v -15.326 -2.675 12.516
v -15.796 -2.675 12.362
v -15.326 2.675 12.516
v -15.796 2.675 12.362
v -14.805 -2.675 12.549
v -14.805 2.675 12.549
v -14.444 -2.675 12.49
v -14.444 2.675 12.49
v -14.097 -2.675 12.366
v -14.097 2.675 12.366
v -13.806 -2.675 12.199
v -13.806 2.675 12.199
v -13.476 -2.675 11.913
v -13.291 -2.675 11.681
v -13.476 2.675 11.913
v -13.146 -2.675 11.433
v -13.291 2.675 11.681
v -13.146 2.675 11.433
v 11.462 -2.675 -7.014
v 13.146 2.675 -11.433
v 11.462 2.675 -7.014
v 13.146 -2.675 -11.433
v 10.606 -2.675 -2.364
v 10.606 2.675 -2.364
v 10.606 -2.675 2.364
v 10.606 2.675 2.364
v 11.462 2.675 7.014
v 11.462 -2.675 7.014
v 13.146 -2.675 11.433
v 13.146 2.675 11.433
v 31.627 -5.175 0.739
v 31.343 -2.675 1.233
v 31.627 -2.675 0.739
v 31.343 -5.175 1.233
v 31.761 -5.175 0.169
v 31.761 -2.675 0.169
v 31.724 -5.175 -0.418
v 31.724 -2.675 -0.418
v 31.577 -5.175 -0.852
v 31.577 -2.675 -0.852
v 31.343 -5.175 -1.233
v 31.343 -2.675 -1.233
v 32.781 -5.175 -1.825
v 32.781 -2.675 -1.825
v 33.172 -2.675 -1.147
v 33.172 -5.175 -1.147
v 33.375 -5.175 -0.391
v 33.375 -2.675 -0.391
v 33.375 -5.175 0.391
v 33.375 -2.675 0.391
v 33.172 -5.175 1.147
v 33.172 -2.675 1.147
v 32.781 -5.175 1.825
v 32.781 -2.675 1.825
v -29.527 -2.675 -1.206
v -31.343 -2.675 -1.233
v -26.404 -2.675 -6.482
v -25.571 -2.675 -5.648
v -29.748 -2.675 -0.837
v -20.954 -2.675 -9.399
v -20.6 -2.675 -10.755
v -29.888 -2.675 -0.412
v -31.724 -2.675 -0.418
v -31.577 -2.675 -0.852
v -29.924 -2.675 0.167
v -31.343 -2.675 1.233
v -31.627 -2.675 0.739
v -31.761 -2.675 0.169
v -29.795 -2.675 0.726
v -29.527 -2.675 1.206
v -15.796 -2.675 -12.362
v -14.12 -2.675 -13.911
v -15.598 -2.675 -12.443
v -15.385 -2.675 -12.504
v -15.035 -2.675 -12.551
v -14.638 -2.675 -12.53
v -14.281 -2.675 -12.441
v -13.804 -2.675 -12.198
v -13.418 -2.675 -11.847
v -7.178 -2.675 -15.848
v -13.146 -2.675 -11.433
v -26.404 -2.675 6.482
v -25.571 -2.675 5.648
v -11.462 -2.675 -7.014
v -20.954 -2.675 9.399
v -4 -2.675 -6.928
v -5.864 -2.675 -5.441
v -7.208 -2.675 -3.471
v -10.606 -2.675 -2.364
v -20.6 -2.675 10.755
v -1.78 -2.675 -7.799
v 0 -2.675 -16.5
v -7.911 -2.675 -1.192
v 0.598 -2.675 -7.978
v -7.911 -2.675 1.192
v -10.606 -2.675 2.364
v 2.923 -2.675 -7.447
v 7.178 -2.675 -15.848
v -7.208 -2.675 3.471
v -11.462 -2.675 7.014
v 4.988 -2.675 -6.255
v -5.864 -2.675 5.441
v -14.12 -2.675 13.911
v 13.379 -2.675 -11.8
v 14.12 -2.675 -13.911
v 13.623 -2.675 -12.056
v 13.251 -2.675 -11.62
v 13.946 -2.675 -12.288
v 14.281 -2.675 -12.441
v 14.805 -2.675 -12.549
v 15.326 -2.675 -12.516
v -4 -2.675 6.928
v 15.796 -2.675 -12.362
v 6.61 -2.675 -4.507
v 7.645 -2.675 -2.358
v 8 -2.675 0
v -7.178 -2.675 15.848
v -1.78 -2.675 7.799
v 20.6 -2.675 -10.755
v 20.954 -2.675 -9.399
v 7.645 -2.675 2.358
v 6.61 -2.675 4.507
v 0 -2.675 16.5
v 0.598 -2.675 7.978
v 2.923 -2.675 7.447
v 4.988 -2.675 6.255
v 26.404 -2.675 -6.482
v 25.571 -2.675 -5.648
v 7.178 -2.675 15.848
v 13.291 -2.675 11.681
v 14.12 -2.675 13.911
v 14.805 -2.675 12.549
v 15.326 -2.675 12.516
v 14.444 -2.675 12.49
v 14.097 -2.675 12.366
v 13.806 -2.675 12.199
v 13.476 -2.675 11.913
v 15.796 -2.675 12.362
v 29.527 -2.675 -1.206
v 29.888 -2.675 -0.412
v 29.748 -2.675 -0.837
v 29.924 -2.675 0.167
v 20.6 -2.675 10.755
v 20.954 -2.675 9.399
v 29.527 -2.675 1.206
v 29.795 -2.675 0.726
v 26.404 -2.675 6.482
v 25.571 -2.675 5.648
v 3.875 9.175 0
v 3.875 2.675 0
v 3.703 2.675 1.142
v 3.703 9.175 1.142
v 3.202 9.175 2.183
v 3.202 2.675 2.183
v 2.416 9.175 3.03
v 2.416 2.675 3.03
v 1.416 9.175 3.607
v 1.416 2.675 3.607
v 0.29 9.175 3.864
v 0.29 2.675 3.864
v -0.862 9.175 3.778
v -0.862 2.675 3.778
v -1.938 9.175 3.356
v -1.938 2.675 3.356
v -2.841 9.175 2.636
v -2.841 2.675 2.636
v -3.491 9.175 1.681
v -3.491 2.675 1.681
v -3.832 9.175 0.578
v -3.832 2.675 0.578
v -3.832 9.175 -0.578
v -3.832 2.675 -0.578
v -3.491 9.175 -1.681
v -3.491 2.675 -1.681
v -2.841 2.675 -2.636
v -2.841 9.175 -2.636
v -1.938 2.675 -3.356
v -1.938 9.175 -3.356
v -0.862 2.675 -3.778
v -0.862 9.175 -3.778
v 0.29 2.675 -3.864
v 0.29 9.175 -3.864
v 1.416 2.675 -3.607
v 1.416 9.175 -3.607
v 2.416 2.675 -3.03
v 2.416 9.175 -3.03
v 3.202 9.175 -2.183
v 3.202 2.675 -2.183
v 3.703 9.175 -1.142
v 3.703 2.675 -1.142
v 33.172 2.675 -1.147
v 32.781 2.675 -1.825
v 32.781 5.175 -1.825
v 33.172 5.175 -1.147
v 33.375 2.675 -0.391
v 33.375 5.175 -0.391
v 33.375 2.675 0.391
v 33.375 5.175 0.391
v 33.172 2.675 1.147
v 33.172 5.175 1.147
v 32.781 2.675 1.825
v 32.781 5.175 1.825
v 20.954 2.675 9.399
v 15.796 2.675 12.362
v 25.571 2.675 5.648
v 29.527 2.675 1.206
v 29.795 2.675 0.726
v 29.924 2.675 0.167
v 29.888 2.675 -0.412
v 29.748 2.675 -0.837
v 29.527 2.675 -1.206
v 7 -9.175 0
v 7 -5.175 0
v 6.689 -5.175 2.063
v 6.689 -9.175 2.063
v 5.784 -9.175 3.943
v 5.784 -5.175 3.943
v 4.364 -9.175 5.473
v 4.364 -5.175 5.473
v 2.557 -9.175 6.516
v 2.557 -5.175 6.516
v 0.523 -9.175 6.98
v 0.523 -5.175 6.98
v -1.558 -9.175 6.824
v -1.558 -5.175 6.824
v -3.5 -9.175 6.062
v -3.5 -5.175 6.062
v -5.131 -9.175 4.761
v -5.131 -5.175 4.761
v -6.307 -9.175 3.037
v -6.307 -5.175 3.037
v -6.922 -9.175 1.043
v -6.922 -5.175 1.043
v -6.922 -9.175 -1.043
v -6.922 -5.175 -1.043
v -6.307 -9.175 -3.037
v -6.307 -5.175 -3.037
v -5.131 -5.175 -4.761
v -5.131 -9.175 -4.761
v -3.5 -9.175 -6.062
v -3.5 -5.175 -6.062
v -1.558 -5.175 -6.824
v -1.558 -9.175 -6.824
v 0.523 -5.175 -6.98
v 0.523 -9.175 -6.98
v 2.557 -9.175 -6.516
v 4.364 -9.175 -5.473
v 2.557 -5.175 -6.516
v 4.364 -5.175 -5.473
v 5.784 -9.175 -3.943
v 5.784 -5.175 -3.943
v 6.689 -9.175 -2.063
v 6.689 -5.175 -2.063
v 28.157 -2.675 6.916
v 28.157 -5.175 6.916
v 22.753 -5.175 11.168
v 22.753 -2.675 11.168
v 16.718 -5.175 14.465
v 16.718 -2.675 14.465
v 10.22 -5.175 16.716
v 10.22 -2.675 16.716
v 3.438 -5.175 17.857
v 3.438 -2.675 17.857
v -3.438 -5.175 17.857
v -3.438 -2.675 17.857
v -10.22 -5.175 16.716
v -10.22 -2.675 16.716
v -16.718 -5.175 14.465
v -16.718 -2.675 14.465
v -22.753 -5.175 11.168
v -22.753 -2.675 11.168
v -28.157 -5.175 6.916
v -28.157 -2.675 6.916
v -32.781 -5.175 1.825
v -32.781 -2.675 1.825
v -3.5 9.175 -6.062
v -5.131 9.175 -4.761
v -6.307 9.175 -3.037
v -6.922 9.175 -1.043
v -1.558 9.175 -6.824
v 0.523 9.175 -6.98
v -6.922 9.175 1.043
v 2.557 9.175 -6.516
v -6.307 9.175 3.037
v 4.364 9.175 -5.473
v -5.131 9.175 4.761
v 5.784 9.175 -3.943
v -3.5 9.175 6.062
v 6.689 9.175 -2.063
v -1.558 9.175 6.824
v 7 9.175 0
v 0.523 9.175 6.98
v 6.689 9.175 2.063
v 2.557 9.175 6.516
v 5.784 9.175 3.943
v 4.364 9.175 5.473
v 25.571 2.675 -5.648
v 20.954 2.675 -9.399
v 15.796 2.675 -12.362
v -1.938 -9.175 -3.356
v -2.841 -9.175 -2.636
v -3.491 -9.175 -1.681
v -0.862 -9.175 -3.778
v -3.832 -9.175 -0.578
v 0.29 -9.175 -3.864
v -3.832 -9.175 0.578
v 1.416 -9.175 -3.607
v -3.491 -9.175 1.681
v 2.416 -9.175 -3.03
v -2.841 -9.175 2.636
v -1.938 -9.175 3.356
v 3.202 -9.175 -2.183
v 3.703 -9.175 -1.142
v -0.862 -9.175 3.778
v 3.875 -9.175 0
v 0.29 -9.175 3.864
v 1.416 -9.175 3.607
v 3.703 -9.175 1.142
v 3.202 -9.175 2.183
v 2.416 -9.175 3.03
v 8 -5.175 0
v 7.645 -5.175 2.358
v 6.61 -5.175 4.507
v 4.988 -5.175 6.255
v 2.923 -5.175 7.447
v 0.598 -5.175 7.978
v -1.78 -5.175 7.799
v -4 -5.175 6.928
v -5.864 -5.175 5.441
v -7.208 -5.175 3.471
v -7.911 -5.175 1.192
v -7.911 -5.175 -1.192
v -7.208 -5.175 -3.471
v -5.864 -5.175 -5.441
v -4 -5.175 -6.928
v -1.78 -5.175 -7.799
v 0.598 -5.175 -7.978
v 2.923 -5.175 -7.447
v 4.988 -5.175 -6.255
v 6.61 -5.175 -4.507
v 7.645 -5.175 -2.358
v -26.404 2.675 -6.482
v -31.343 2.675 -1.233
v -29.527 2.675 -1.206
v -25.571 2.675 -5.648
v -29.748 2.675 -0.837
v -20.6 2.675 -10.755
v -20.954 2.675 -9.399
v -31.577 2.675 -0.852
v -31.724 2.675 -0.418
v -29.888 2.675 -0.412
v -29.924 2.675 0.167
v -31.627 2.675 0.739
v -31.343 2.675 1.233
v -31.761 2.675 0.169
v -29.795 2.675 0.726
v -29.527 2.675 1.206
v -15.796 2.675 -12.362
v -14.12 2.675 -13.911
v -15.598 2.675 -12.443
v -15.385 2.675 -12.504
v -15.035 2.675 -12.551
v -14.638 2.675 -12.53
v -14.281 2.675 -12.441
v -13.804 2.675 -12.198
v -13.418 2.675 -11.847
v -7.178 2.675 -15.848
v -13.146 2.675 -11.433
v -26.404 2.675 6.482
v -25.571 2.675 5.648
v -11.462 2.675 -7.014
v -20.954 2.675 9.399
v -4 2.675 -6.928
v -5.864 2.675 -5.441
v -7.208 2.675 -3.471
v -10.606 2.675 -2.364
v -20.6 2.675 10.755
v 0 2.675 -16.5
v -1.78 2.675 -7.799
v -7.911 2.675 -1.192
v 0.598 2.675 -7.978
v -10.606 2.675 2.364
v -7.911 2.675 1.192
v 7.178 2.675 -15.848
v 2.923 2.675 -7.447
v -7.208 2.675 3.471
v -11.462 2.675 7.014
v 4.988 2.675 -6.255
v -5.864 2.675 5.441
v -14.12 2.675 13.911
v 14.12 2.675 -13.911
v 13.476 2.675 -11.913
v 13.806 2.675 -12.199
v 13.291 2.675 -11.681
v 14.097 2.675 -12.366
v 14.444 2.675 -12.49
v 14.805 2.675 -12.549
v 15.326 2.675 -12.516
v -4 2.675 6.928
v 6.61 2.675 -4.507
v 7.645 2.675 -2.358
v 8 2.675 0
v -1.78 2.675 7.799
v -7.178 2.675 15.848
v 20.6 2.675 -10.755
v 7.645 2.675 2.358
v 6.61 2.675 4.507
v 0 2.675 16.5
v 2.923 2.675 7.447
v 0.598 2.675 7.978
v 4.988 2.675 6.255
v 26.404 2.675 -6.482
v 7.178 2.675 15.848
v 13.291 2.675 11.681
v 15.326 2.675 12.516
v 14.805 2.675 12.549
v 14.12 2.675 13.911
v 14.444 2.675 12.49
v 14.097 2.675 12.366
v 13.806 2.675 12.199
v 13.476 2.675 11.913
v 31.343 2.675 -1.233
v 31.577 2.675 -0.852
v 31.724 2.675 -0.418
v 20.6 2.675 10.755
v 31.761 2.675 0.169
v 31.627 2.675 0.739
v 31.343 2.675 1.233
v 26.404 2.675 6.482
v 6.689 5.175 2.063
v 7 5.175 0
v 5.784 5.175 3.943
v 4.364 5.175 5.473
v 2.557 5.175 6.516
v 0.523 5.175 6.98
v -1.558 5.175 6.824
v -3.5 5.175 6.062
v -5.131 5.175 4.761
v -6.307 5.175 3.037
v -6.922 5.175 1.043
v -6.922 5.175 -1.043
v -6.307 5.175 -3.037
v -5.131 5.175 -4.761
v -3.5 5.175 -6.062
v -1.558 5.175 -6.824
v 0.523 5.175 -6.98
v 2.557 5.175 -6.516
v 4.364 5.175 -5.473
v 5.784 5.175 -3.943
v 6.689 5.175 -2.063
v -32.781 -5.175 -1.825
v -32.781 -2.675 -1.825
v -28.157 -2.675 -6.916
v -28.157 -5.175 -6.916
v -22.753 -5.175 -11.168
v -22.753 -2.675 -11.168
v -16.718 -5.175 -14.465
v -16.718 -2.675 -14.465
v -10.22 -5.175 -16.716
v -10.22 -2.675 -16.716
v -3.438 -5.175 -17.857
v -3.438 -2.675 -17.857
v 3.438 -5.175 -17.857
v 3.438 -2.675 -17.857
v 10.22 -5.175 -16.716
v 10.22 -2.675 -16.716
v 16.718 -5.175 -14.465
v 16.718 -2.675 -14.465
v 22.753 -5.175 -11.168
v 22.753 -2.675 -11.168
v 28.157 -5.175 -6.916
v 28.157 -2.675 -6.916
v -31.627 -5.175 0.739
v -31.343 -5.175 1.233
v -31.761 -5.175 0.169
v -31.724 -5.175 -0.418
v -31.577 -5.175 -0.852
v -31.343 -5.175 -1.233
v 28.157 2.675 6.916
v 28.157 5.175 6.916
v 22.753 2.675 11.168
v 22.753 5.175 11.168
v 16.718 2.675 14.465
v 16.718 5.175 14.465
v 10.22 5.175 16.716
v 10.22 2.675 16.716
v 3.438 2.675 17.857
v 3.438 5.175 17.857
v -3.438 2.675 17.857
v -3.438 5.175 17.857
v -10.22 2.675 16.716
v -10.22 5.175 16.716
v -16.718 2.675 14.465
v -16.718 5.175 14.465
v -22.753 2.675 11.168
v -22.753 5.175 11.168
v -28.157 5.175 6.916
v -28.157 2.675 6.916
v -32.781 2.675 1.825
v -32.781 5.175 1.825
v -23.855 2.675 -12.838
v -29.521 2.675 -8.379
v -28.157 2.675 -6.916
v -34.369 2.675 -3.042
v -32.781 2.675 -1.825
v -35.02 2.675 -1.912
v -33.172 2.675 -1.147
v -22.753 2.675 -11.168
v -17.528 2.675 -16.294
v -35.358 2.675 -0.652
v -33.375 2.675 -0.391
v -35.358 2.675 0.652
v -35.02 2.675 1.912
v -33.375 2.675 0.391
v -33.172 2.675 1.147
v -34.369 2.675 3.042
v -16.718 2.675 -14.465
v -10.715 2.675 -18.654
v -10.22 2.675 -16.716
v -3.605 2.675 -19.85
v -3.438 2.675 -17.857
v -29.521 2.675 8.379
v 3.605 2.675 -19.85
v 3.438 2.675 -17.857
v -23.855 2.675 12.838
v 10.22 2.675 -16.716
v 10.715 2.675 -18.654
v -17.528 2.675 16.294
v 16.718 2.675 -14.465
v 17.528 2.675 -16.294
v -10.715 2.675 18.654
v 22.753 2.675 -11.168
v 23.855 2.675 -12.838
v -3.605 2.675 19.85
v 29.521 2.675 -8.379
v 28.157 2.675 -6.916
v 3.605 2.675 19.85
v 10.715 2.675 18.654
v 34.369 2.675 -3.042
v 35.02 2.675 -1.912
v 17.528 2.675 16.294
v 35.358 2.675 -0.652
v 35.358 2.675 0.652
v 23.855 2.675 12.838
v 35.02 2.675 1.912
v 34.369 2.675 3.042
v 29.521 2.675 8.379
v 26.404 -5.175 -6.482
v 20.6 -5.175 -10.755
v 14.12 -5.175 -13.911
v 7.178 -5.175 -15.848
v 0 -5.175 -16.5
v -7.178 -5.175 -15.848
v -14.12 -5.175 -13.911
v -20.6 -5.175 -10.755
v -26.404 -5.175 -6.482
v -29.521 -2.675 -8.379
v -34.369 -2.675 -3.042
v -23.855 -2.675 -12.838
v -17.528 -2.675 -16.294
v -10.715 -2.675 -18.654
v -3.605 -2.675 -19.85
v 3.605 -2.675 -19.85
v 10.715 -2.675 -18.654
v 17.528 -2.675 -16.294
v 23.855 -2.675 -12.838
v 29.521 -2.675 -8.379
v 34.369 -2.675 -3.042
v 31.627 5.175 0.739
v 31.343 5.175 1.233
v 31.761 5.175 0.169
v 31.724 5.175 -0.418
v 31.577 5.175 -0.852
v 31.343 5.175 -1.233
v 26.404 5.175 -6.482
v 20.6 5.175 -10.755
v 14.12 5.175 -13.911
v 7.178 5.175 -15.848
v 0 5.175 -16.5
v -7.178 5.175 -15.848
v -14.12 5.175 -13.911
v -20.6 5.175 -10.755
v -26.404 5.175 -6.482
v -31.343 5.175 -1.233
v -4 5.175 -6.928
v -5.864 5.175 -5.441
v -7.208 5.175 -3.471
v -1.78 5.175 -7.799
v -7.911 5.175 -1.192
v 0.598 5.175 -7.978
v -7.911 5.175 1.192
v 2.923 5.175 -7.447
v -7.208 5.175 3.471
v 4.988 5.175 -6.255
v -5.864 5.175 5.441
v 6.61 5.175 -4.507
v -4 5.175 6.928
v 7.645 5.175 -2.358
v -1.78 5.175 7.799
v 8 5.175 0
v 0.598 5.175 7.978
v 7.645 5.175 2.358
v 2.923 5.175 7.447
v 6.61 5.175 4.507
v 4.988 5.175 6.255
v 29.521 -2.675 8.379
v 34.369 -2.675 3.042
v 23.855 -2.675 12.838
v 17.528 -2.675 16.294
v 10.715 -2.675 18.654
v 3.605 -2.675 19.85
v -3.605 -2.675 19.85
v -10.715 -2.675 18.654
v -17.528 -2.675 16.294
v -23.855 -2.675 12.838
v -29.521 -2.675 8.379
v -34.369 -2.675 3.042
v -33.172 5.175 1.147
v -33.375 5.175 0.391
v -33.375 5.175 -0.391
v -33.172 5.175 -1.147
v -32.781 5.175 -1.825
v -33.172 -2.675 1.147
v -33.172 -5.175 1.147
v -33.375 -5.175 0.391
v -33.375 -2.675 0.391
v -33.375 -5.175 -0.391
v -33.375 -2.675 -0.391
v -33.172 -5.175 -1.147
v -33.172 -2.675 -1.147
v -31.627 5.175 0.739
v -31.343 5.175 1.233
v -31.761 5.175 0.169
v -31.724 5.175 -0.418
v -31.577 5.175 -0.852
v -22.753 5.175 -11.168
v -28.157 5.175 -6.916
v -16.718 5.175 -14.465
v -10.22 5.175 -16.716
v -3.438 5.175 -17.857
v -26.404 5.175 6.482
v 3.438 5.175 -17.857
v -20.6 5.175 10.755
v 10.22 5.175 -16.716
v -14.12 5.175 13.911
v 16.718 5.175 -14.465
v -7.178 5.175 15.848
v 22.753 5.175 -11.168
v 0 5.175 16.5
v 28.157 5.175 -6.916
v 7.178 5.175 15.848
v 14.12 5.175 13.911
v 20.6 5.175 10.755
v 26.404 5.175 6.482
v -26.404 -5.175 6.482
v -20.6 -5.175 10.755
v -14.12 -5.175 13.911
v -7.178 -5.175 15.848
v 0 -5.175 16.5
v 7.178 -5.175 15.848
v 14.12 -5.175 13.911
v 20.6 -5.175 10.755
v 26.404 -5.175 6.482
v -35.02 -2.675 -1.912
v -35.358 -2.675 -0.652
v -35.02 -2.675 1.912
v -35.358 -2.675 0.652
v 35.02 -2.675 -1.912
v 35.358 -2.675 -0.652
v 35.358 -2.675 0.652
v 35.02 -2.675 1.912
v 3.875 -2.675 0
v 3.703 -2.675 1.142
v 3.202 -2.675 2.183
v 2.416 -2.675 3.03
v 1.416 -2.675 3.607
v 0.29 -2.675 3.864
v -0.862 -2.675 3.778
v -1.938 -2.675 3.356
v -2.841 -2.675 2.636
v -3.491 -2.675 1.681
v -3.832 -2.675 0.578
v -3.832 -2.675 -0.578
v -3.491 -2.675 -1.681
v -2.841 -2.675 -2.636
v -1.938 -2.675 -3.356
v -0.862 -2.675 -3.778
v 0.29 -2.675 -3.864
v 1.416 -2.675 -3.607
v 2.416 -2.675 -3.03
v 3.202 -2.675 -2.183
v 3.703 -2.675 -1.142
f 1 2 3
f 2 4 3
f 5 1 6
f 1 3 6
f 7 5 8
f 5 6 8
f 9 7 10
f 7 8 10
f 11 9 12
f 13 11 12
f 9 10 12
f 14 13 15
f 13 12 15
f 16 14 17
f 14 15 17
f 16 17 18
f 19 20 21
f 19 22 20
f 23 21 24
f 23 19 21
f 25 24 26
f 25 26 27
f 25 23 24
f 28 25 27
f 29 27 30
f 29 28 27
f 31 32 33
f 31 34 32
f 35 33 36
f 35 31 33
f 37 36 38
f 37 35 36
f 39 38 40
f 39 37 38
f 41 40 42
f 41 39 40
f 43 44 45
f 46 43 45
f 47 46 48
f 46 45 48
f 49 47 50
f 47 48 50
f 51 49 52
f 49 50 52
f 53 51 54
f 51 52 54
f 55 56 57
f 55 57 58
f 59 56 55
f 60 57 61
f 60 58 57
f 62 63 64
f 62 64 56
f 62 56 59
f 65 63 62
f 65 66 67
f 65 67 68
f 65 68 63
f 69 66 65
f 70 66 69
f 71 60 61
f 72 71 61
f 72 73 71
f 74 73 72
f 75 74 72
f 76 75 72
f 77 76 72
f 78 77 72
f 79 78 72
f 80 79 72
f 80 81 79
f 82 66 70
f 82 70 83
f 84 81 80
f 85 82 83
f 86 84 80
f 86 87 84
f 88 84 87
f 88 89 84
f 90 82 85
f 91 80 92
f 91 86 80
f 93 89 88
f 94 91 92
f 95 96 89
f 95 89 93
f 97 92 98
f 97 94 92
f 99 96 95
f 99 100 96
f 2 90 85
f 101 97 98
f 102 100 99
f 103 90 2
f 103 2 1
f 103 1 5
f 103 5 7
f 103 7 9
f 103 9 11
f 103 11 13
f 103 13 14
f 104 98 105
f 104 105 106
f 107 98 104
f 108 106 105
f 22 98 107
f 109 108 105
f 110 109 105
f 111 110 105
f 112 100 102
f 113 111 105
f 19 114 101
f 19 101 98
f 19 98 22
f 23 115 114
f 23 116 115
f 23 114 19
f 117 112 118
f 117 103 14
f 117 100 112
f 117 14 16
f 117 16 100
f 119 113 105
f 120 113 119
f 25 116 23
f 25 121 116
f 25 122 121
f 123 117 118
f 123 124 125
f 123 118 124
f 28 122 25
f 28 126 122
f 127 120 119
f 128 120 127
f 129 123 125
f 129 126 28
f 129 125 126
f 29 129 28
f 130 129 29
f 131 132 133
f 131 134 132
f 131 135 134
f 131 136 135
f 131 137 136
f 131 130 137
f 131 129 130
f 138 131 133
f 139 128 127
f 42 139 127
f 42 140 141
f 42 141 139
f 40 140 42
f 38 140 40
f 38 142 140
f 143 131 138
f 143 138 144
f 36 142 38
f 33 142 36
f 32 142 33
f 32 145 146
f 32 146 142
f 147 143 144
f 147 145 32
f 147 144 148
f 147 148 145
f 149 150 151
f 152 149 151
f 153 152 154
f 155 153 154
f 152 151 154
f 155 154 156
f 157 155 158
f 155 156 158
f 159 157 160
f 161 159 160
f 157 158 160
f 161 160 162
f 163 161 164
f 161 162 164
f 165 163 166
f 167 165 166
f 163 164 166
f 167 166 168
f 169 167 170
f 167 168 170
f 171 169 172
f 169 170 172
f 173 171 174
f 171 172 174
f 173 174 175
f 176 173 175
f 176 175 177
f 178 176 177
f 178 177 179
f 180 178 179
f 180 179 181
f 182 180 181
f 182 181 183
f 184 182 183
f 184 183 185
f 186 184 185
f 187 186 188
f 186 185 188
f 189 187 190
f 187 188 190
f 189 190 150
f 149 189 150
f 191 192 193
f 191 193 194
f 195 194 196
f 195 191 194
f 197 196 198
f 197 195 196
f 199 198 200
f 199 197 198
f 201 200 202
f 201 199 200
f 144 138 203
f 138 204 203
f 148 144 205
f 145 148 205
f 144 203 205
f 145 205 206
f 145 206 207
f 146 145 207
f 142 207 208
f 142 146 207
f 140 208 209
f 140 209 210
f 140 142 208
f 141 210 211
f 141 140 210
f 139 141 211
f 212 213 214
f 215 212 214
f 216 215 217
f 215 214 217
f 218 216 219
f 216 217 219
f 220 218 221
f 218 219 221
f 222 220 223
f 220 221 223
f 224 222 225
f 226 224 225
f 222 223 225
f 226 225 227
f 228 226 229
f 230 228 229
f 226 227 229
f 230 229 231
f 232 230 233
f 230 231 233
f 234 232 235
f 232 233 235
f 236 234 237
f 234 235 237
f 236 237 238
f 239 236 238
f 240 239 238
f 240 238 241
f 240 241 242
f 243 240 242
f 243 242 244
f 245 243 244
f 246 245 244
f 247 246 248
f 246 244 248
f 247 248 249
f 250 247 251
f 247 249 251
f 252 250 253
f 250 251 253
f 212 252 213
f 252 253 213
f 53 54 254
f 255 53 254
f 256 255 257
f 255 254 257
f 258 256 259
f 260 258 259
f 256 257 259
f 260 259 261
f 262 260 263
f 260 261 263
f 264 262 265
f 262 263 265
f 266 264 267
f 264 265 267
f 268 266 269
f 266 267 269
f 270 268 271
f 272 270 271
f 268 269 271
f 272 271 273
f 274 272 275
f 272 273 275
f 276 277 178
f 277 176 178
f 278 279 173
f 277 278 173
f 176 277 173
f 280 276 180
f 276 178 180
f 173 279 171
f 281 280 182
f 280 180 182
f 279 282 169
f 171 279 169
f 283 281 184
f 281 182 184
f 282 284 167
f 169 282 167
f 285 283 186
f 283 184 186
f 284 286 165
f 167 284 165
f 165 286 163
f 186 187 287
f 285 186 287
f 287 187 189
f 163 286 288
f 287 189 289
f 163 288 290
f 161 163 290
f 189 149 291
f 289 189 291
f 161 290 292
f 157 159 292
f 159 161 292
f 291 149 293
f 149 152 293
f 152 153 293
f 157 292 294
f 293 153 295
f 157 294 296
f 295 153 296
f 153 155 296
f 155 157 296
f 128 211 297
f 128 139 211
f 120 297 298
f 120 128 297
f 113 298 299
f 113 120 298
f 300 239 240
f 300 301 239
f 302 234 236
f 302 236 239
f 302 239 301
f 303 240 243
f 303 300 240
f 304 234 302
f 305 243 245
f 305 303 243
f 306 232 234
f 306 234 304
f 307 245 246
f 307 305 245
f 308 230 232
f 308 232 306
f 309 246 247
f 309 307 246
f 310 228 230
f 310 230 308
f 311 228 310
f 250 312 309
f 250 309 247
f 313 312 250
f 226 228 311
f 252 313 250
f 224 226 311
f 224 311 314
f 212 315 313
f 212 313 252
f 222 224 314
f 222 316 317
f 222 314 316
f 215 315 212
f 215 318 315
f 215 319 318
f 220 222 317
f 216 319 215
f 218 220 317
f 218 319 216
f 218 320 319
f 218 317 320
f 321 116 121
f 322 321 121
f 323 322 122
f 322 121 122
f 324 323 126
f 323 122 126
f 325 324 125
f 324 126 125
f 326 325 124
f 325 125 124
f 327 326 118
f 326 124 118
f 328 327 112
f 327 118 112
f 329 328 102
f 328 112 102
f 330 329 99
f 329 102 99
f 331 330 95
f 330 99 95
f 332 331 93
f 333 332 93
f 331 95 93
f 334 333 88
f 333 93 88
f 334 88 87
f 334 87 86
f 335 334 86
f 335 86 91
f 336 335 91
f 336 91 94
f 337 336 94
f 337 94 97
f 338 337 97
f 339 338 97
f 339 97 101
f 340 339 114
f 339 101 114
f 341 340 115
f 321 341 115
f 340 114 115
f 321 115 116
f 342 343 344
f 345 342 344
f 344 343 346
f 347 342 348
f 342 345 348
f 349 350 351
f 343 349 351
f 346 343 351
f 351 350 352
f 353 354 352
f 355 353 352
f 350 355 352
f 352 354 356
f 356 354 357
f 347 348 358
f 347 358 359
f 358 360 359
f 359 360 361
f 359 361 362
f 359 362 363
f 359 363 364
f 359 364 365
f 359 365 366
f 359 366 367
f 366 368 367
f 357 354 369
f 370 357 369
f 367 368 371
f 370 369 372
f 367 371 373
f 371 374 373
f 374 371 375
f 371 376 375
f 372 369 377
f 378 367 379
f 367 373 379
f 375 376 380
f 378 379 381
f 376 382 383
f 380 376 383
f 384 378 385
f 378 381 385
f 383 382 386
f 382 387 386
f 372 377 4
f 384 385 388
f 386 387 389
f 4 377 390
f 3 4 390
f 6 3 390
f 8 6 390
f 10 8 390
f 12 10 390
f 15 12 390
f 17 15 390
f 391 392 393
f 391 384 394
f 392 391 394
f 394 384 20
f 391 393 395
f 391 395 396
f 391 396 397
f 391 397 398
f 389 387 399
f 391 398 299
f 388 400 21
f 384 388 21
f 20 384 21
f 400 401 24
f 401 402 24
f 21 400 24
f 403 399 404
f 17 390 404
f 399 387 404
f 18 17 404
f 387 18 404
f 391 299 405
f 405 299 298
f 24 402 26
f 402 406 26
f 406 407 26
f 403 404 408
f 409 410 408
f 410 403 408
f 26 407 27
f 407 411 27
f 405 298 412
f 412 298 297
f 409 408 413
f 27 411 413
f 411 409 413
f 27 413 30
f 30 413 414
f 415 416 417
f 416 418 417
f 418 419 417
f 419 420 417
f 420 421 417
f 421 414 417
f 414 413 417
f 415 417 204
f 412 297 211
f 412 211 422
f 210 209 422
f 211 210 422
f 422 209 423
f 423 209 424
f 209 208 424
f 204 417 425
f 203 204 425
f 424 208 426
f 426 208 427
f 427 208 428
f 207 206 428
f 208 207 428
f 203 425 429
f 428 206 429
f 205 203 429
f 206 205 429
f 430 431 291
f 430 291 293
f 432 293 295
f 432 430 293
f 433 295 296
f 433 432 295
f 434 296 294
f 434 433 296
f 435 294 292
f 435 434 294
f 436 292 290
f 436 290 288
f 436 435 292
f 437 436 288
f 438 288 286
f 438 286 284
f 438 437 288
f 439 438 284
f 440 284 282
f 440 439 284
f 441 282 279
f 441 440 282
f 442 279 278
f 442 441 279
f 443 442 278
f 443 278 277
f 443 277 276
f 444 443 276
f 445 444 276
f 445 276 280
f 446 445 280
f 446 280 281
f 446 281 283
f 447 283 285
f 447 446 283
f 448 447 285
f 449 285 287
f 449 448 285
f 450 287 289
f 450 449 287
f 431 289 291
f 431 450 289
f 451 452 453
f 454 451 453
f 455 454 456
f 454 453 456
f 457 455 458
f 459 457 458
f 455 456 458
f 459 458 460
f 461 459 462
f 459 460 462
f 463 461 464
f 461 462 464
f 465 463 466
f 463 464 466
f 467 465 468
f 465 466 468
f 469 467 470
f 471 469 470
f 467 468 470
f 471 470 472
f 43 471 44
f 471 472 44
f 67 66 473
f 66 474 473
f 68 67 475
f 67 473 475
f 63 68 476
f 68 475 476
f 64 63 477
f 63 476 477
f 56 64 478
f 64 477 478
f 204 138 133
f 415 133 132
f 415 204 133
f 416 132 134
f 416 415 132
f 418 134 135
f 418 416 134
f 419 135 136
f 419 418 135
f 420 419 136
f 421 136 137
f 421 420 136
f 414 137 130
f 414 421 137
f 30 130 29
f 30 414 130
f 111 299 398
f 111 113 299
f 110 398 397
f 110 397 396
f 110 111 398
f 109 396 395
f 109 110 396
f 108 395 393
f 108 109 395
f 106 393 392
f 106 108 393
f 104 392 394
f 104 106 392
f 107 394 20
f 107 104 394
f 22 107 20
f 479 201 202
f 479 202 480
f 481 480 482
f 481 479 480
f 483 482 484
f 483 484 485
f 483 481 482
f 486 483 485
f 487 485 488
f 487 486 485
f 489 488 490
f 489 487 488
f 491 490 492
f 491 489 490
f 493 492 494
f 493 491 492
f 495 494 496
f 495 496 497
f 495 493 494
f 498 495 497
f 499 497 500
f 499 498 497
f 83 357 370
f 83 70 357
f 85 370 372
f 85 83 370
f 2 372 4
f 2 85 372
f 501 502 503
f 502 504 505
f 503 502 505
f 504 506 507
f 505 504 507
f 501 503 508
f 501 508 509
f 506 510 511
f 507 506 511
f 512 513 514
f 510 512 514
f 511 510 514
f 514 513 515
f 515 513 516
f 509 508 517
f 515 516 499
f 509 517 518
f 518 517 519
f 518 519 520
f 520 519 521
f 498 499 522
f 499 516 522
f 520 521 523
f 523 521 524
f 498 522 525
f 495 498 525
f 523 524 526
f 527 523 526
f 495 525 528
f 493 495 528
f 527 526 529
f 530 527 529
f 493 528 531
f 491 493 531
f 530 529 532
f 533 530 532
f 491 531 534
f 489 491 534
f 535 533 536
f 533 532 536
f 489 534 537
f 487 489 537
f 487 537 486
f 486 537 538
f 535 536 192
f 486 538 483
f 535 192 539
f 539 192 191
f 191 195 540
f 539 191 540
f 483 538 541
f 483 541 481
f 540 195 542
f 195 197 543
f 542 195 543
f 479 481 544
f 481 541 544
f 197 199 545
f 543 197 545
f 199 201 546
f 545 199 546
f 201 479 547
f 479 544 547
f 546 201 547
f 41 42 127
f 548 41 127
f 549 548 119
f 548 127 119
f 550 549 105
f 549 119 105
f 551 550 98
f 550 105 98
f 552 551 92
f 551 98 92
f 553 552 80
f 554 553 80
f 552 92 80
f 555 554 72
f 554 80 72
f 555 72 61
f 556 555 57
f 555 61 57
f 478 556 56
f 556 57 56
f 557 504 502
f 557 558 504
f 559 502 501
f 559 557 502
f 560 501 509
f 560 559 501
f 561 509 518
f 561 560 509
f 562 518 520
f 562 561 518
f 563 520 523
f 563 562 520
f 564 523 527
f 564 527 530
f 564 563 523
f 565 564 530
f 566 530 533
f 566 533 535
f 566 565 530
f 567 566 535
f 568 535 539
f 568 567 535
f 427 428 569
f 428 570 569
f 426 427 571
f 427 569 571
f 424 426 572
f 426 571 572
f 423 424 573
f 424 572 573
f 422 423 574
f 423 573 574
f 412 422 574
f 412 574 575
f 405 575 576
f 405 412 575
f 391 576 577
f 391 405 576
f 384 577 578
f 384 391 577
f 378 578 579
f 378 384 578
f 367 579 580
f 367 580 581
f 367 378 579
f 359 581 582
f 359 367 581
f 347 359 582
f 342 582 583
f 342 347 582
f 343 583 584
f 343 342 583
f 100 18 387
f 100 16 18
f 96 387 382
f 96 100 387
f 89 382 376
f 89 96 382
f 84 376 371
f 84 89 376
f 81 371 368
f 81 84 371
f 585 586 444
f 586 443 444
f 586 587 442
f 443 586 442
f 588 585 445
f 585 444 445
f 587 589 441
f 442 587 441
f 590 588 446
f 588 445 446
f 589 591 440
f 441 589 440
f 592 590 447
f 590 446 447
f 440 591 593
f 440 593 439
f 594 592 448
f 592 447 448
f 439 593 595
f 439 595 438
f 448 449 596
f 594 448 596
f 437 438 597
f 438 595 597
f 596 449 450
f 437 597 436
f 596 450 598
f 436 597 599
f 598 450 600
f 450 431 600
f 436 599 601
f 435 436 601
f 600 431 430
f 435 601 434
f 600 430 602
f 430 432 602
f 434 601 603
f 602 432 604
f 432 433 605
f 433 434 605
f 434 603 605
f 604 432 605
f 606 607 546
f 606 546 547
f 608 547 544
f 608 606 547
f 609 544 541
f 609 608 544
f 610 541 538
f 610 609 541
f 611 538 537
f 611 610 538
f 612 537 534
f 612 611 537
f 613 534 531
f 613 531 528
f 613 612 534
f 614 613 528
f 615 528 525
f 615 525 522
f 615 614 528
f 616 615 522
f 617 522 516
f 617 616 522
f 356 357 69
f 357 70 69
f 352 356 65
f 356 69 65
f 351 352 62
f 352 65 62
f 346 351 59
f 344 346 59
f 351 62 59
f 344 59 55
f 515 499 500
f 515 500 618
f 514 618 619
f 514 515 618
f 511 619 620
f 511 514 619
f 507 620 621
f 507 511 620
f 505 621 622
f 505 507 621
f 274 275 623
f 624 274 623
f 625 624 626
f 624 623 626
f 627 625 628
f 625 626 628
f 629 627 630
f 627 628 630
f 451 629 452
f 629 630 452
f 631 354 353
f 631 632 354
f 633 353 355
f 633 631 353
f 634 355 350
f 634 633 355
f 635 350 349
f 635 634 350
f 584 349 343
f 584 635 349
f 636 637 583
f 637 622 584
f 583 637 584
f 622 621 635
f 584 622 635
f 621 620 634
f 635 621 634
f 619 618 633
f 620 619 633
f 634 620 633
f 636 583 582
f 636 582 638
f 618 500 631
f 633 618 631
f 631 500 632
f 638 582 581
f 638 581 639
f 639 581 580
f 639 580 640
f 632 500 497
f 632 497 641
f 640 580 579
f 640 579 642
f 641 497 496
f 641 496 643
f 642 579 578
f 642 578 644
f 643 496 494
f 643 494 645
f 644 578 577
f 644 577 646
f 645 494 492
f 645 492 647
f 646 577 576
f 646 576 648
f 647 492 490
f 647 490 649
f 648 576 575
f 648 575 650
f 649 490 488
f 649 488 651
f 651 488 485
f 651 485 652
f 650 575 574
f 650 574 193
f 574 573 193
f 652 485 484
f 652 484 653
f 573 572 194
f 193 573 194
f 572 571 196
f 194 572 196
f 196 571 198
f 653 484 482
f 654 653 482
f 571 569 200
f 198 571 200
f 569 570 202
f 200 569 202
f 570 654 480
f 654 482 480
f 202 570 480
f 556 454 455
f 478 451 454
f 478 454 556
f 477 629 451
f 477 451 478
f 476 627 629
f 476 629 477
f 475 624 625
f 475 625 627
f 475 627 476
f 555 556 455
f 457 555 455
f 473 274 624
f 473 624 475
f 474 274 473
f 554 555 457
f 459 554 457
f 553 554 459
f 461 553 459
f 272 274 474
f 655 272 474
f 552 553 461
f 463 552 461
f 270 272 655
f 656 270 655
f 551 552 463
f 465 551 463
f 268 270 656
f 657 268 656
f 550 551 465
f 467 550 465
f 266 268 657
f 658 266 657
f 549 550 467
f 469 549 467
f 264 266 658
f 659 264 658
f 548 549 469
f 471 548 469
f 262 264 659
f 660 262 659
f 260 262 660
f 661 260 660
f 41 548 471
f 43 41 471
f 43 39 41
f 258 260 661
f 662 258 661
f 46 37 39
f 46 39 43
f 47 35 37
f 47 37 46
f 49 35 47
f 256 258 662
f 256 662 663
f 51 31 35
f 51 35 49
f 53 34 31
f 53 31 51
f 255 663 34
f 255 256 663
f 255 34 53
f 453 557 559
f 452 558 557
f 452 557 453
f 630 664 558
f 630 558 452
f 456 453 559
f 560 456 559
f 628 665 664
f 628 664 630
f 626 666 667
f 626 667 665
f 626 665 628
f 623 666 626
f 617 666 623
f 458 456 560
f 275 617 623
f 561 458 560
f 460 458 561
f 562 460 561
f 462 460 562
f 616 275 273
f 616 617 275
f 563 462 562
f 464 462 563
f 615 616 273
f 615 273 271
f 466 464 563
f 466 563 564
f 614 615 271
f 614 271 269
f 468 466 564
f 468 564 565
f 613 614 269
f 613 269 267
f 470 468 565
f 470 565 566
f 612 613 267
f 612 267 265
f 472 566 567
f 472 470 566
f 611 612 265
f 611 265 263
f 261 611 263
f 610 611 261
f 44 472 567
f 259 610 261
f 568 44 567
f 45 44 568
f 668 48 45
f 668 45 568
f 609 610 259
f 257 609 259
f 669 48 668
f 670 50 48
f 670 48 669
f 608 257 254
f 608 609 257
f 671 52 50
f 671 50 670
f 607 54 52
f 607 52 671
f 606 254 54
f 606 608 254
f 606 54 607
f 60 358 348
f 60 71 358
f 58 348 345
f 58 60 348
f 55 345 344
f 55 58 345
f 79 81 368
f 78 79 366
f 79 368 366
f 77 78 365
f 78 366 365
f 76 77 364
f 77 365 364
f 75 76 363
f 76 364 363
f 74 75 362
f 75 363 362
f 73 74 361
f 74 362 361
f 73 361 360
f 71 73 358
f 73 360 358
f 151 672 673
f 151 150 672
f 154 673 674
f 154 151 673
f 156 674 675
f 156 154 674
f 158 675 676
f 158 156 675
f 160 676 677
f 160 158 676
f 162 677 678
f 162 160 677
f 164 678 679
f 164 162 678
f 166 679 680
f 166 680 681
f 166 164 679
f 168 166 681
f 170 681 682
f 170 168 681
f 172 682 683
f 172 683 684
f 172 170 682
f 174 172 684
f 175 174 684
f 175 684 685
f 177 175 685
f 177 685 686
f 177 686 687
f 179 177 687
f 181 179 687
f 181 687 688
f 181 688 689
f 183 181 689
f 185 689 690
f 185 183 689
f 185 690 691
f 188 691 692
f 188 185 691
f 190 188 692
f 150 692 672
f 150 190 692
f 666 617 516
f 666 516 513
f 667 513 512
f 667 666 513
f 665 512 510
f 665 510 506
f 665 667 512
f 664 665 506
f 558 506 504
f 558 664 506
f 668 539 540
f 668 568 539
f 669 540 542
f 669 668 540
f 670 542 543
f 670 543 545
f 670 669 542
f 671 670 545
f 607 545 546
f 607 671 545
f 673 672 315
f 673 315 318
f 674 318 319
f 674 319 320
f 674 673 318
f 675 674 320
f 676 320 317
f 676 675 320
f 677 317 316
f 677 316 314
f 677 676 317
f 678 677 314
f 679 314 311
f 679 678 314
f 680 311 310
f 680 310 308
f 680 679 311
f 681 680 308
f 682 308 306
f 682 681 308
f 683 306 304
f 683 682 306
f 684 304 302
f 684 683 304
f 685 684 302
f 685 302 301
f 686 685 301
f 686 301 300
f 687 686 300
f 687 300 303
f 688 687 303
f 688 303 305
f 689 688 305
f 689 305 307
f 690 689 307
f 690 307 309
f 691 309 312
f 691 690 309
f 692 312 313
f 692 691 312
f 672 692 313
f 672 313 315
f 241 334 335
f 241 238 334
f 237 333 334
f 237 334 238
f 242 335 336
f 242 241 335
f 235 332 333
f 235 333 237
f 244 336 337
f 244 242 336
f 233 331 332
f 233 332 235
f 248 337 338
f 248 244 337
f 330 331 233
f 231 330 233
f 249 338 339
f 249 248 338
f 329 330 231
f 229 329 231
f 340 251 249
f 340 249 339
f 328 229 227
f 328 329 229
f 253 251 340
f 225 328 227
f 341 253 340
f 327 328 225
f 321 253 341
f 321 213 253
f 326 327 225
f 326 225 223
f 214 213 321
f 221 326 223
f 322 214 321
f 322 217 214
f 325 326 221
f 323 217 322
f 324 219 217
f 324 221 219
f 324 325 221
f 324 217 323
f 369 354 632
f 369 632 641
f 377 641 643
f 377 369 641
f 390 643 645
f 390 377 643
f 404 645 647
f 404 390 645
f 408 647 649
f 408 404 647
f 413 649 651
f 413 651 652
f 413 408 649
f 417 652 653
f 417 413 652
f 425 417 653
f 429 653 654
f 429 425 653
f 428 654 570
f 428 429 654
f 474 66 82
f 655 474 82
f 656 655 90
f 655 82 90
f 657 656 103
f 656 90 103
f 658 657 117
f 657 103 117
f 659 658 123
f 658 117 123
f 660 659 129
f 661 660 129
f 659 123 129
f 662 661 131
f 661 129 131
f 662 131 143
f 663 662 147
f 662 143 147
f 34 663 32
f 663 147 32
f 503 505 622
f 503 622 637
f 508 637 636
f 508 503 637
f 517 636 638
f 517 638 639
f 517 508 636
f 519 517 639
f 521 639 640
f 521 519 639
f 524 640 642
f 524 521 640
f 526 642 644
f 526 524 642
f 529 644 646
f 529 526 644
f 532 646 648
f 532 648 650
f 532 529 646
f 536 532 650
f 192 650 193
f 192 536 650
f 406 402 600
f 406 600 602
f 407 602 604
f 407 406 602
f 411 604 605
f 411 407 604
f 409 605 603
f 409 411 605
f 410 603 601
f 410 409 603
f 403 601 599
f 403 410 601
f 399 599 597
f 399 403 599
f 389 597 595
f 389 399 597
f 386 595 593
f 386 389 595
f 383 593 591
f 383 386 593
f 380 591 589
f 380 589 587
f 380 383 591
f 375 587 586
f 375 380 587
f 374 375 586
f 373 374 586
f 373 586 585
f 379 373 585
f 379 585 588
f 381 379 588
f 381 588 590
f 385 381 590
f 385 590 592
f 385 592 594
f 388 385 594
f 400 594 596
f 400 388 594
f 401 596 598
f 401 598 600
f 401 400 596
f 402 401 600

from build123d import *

# Parameters (mm, degrees)
F0_R     = 3.875
F1_DEPTH = 2.675
F2_R     = 2
F3_R     = 8
F3_R_2   = 3.875
F4_DEPTH = 2.5
F5_R     = 2
F6_R     = 7
F6_R_2   = 3.875
F7_DEPTH = 4


with BuildPart() as f1:
    # F0 (on Front) → F1 (new body, symmetric)
    with BuildSketch(Plane.XZ):
        with BuildLine():
            ThreePointArc((34.3685322209, -3.0420949584), (35.4004522993, 0), (34.3685322209, 3.0420949584))
            ThreePointArc((34.3685322209, 3.0420949584), (0, 20), (-34.3685322209, 3.0420949584))
            ThreePointArc((-34.3685322209, 3.0420949584), (-35.4004522993, 0), (-34.3685322209, -3.0420949584))
            ThreePointArc((-34.3685322209, -3.0420949584), (0, -20), (34.3685322209, -3.0420949584))
        make_face()
        with BuildLine():
            ThreePointArc((-30.4004522993, 0), (-23.1775008297, 7.7461532708), (-14.0563482176, 13.129320875))
            ThreePointArc((-14.0563482176, 13.129320875), (-10.4981429131, 0), (-14.0563482176, -13.129320875))
            ThreePointArc((-14.0563482176, -13.129320875), (-23.1775008297, -7.7461532708), (-30.4004522993, 0))
        make_face(mode=Mode.SUBTRACT)
        Circle(F0_R, mode=Mode.SUBTRACT)
        with BuildLine():
            ThreePointArc((14.0563482176, 13.129320875), (23.1775008297, 7.7461532708), (30.4004522993, 0))
            ThreePointArc((30.4004522993, 0), (23.1775008297, -7.7461532708), (14.0563482176, -13.129320875))
            ThreePointArc((14.0563482176, -13.129320875), (10.4981429131, 0), (14.0563482176, 13.129320875))
        make_face(mode=Mode.SUBTRACT)
    extrude(amount=F1_DEPTH, both=True)

    # F2
    f2_edges = [f1.edges().sort_by_distance(p)[0] for p in [
        (-14.056348, 0, 13.129321),
        (-30.400452, 0, 0),
        (-14.056348, 0, -13.129321),
        (14.056348, 0, 13.129321),
        (30.400452, 0, 0),
        (14.056348, 0, -13.129321),
    ]]
    fillet(f2_edges, radius=F2_R)

    # F3 (on face) → F4 (join)
    with BuildSketch(Plane.XZ.offset(2.675)):
        with BuildLine():
            ThreePointArc((32.7813002522, -1.825256975), (33.4004522993, 0), (32.7813002522, 1.825256975))
            ThreePointArc((32.7813002522, 1.825256975), (0, 18), (-32.7813002522, 1.825256975))
            ThreePointArc((-32.7813002522, 1.825256975), (-33.4004522993, 0), (-32.7813002522, -1.825256975))
            ThreePointArc((-32.7813002522, -1.825256975), (0, -18), (32.7813002522, -1.825256975))
        make_face()
        with BuildLine():
            ThreePointArc((-32.2700519058, 0), (0, 16.5), (32.2700519058, 0))
            ThreePointArc((32.2700519058, 0), (0, -16.5), (-32.2700519058, 0))
        make_face(mode=Mode.SUBTRACT)
        Circle(F3_R)
        Circle(F3_R_2, mode=Mode.SUBTRACT)
    extrude(amount=F4_DEPTH)

    # F5
    f5_edges = [f1.edges().sort_by_distance(p)[0] for p in [
        (-32.270052, -3.925, 0),
        (32.270052, -3.925, 0),
    ]]
    fillet(f5_edges, radius=F5_R)

    # F6 (on face) → F7 (join)
    with BuildSketch(Plane.XZ.offset(5.175)):
        Circle(F6_R)
        Circle(F6_R_2, mode=Mode.SUBTRACT)
    extrude(amount=F7_DEPTH)

    # F8: F1 across plane


with BuildPart() as f1_1:
    add(f1.part)
    add(f1.part.mirror(Plane.XZ))


solid = f1_1.part
